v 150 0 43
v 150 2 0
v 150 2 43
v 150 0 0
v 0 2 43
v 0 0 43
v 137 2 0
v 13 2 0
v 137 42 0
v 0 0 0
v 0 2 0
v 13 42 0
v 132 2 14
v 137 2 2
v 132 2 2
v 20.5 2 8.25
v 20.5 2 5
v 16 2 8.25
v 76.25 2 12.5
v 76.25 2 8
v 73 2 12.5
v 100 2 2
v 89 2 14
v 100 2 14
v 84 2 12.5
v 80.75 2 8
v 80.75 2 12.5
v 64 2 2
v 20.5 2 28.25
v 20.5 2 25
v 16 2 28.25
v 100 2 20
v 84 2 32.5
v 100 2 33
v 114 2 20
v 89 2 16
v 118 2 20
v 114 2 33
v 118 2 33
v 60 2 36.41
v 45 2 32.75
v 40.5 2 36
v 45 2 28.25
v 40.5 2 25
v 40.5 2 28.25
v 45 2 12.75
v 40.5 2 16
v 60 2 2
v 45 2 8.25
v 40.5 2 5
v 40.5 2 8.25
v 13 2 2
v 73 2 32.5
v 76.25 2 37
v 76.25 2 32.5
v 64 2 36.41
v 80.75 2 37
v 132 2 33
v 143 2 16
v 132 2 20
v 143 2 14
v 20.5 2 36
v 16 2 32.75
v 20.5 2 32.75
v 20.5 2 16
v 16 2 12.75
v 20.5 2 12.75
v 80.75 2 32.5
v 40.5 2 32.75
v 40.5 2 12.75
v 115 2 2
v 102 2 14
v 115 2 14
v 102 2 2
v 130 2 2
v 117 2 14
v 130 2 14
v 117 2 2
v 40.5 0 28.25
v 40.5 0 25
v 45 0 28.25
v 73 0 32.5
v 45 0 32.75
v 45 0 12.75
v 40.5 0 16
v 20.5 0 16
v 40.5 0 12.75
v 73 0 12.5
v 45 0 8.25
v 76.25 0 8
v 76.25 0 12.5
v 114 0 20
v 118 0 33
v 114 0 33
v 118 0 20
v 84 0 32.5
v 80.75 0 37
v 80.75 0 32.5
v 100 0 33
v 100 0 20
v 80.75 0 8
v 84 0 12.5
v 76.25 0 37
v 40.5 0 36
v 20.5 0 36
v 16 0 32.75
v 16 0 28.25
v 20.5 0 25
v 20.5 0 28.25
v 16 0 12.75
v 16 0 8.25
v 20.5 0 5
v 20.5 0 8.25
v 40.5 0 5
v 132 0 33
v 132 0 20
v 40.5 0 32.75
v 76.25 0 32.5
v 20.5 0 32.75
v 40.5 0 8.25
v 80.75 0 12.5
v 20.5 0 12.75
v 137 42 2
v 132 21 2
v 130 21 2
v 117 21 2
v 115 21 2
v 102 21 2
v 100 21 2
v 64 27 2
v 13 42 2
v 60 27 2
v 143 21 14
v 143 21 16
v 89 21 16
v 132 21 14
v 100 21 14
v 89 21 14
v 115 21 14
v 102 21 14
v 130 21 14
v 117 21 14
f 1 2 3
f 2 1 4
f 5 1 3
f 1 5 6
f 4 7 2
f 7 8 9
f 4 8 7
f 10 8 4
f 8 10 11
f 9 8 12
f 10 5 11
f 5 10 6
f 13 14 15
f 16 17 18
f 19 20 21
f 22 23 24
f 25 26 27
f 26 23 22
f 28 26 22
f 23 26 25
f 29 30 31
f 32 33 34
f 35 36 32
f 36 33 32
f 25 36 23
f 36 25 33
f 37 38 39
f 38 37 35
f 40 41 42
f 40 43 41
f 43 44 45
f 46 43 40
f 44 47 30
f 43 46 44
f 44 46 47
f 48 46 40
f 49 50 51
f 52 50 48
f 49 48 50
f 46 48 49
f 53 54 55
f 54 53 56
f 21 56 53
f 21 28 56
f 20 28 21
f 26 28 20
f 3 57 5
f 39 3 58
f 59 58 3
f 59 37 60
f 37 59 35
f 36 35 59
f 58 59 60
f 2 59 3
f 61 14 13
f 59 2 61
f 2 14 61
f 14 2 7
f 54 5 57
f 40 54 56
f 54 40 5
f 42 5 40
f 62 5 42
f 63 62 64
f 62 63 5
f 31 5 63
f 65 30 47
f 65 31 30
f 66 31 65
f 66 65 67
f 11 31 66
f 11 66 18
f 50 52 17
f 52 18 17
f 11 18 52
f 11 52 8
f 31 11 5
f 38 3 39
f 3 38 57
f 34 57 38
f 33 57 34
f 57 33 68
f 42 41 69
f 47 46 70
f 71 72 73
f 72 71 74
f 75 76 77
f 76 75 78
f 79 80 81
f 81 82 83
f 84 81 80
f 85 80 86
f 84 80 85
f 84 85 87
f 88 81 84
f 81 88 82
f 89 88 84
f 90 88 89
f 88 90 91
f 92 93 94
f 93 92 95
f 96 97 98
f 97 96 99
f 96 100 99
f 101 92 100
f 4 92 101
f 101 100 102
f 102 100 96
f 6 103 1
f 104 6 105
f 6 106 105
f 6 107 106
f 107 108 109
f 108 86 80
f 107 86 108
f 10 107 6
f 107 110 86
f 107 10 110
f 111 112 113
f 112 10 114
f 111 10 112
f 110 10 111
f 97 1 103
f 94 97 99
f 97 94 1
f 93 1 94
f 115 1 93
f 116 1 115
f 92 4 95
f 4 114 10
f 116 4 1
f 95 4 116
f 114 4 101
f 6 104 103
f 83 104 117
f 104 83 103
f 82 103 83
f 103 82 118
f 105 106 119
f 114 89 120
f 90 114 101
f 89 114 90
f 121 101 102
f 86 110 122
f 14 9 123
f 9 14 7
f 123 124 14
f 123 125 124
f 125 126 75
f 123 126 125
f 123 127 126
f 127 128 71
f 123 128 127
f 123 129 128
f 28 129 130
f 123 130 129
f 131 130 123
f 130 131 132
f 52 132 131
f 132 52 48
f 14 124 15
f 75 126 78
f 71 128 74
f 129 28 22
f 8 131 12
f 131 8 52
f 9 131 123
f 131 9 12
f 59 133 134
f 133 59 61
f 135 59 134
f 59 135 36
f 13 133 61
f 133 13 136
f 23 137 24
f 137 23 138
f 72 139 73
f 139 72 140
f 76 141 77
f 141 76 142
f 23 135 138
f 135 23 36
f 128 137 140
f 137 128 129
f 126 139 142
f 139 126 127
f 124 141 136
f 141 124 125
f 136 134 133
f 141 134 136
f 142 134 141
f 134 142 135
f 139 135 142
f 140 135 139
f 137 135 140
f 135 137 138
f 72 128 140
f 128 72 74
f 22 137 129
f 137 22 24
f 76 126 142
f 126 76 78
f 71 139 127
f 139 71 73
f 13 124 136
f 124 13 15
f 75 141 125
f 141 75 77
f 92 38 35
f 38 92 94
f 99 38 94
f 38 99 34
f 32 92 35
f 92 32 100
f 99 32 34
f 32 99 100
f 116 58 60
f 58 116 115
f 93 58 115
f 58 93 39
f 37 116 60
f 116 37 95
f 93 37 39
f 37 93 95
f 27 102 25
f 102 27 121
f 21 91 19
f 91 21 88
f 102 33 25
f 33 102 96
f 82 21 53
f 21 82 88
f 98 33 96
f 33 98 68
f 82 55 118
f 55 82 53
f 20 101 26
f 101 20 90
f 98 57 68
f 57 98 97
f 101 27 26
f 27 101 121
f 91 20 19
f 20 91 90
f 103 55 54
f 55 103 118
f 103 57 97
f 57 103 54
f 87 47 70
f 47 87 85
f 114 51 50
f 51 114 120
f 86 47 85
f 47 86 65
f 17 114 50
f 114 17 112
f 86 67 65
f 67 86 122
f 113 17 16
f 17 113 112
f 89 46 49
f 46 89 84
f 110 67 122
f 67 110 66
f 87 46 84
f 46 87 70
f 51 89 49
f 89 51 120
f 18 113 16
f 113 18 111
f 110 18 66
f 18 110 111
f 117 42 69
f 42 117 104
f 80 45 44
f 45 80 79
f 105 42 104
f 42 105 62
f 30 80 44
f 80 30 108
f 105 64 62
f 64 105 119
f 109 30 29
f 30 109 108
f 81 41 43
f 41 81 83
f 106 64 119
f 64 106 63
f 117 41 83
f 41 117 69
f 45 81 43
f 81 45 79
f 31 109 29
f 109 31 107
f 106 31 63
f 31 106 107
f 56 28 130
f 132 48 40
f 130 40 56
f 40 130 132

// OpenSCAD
$fn = 50;

module panel() {
    cube([198,2,78]);
}

module lcd_hole() {
    translate([0,-1,0])
    cube([99,4,41]);
}

module dsub_hole() {
    translate([0,-1,0])
    union() {
        translate([5.5,0,0])
            cube([20,4,11]);
        translate([1,0,3.25])
            cube([29,4,4.5]);
    }
}

module ps2_hole() {
    translate([0,-1,0]) {
        cube([14,4,13]);
        translate([14+4,0,0])
        cube([14,4,13]);
    }
}

module ps2_shelf() {
    translate([-11,0,-6])
        cube([54,21,2]);
}

module back_panel() {
    difference() {
        panel();
        translate([22,3,8]) {
            translate([0,0,0]) {
                rotate([90,0,0])
                    cylinder(d=5,h=4);
            }
            translate([0,0,61]) {
                rotate([90,0,0])
                    cylinder(d=5,h=4);
            }
            translate([76,0,0]) {
                rotate([90,0,0])
                    cylinder(d=5,h=4);
            }
            translate([76,0,61]) {
                rotate([90,0,0])
                    cylinder(d=5,h=4);
           }
        }
        translate([149,-1.25,10])
            cube([30,2,32]);
        translate([150,-1,10])
            cube([28,4,32]);
            
    }
}

module front_panel() {
    difference() {
        union() {
            panel();
            translate([150,0,10])
                ps2_shelf();
        }
        translate([150,0,10])
            ps2_hole();
        translate([125,0,50])
            rotate([0,90,0])
                dsub_hole();
        translate([170,0,68])
            rotate([0,90,0])
                dsub_hole();
        translate([152,0,68])
            rotate([0,90,0])
                dsub_hole();
        translate([10,0,12])
            lcd_hole();
        
    }
    
}

module bottom_plate() {
    cube([124,170,2]);
}

module front_plate() {
    difference() {
        union() {
            cube([150,2,43]);
            translate([(150.0-124.0)/2.0,0,0])
                cube([124,22+20,2]);
            translate([100,0,20])
                    ps2_shelf();
            translate([100,0,0])
                cube([2,21,15]);
            translate([115,0,0])
                cube([2,21,15]);
            translate([130,0,0])
                cube([2,21,15]);
        }
        translate([100,0,20])
            ps2_hole();
        translate([73,0,38])
            rotate([0,90,0])
                dsub_hole();
        translate([15,0,5])
                dsub_hole();
        translate([15,0,25])
                dsub_hole();
    }
}

module extra_support() {
    difference() {
        cube([4,25,35]);
        translate([-1,25,0])
            rotate([36,0,0])
                cube([6,25,50]);
    }
}

front_plate();
translate([60,2,2])
extra_support();
